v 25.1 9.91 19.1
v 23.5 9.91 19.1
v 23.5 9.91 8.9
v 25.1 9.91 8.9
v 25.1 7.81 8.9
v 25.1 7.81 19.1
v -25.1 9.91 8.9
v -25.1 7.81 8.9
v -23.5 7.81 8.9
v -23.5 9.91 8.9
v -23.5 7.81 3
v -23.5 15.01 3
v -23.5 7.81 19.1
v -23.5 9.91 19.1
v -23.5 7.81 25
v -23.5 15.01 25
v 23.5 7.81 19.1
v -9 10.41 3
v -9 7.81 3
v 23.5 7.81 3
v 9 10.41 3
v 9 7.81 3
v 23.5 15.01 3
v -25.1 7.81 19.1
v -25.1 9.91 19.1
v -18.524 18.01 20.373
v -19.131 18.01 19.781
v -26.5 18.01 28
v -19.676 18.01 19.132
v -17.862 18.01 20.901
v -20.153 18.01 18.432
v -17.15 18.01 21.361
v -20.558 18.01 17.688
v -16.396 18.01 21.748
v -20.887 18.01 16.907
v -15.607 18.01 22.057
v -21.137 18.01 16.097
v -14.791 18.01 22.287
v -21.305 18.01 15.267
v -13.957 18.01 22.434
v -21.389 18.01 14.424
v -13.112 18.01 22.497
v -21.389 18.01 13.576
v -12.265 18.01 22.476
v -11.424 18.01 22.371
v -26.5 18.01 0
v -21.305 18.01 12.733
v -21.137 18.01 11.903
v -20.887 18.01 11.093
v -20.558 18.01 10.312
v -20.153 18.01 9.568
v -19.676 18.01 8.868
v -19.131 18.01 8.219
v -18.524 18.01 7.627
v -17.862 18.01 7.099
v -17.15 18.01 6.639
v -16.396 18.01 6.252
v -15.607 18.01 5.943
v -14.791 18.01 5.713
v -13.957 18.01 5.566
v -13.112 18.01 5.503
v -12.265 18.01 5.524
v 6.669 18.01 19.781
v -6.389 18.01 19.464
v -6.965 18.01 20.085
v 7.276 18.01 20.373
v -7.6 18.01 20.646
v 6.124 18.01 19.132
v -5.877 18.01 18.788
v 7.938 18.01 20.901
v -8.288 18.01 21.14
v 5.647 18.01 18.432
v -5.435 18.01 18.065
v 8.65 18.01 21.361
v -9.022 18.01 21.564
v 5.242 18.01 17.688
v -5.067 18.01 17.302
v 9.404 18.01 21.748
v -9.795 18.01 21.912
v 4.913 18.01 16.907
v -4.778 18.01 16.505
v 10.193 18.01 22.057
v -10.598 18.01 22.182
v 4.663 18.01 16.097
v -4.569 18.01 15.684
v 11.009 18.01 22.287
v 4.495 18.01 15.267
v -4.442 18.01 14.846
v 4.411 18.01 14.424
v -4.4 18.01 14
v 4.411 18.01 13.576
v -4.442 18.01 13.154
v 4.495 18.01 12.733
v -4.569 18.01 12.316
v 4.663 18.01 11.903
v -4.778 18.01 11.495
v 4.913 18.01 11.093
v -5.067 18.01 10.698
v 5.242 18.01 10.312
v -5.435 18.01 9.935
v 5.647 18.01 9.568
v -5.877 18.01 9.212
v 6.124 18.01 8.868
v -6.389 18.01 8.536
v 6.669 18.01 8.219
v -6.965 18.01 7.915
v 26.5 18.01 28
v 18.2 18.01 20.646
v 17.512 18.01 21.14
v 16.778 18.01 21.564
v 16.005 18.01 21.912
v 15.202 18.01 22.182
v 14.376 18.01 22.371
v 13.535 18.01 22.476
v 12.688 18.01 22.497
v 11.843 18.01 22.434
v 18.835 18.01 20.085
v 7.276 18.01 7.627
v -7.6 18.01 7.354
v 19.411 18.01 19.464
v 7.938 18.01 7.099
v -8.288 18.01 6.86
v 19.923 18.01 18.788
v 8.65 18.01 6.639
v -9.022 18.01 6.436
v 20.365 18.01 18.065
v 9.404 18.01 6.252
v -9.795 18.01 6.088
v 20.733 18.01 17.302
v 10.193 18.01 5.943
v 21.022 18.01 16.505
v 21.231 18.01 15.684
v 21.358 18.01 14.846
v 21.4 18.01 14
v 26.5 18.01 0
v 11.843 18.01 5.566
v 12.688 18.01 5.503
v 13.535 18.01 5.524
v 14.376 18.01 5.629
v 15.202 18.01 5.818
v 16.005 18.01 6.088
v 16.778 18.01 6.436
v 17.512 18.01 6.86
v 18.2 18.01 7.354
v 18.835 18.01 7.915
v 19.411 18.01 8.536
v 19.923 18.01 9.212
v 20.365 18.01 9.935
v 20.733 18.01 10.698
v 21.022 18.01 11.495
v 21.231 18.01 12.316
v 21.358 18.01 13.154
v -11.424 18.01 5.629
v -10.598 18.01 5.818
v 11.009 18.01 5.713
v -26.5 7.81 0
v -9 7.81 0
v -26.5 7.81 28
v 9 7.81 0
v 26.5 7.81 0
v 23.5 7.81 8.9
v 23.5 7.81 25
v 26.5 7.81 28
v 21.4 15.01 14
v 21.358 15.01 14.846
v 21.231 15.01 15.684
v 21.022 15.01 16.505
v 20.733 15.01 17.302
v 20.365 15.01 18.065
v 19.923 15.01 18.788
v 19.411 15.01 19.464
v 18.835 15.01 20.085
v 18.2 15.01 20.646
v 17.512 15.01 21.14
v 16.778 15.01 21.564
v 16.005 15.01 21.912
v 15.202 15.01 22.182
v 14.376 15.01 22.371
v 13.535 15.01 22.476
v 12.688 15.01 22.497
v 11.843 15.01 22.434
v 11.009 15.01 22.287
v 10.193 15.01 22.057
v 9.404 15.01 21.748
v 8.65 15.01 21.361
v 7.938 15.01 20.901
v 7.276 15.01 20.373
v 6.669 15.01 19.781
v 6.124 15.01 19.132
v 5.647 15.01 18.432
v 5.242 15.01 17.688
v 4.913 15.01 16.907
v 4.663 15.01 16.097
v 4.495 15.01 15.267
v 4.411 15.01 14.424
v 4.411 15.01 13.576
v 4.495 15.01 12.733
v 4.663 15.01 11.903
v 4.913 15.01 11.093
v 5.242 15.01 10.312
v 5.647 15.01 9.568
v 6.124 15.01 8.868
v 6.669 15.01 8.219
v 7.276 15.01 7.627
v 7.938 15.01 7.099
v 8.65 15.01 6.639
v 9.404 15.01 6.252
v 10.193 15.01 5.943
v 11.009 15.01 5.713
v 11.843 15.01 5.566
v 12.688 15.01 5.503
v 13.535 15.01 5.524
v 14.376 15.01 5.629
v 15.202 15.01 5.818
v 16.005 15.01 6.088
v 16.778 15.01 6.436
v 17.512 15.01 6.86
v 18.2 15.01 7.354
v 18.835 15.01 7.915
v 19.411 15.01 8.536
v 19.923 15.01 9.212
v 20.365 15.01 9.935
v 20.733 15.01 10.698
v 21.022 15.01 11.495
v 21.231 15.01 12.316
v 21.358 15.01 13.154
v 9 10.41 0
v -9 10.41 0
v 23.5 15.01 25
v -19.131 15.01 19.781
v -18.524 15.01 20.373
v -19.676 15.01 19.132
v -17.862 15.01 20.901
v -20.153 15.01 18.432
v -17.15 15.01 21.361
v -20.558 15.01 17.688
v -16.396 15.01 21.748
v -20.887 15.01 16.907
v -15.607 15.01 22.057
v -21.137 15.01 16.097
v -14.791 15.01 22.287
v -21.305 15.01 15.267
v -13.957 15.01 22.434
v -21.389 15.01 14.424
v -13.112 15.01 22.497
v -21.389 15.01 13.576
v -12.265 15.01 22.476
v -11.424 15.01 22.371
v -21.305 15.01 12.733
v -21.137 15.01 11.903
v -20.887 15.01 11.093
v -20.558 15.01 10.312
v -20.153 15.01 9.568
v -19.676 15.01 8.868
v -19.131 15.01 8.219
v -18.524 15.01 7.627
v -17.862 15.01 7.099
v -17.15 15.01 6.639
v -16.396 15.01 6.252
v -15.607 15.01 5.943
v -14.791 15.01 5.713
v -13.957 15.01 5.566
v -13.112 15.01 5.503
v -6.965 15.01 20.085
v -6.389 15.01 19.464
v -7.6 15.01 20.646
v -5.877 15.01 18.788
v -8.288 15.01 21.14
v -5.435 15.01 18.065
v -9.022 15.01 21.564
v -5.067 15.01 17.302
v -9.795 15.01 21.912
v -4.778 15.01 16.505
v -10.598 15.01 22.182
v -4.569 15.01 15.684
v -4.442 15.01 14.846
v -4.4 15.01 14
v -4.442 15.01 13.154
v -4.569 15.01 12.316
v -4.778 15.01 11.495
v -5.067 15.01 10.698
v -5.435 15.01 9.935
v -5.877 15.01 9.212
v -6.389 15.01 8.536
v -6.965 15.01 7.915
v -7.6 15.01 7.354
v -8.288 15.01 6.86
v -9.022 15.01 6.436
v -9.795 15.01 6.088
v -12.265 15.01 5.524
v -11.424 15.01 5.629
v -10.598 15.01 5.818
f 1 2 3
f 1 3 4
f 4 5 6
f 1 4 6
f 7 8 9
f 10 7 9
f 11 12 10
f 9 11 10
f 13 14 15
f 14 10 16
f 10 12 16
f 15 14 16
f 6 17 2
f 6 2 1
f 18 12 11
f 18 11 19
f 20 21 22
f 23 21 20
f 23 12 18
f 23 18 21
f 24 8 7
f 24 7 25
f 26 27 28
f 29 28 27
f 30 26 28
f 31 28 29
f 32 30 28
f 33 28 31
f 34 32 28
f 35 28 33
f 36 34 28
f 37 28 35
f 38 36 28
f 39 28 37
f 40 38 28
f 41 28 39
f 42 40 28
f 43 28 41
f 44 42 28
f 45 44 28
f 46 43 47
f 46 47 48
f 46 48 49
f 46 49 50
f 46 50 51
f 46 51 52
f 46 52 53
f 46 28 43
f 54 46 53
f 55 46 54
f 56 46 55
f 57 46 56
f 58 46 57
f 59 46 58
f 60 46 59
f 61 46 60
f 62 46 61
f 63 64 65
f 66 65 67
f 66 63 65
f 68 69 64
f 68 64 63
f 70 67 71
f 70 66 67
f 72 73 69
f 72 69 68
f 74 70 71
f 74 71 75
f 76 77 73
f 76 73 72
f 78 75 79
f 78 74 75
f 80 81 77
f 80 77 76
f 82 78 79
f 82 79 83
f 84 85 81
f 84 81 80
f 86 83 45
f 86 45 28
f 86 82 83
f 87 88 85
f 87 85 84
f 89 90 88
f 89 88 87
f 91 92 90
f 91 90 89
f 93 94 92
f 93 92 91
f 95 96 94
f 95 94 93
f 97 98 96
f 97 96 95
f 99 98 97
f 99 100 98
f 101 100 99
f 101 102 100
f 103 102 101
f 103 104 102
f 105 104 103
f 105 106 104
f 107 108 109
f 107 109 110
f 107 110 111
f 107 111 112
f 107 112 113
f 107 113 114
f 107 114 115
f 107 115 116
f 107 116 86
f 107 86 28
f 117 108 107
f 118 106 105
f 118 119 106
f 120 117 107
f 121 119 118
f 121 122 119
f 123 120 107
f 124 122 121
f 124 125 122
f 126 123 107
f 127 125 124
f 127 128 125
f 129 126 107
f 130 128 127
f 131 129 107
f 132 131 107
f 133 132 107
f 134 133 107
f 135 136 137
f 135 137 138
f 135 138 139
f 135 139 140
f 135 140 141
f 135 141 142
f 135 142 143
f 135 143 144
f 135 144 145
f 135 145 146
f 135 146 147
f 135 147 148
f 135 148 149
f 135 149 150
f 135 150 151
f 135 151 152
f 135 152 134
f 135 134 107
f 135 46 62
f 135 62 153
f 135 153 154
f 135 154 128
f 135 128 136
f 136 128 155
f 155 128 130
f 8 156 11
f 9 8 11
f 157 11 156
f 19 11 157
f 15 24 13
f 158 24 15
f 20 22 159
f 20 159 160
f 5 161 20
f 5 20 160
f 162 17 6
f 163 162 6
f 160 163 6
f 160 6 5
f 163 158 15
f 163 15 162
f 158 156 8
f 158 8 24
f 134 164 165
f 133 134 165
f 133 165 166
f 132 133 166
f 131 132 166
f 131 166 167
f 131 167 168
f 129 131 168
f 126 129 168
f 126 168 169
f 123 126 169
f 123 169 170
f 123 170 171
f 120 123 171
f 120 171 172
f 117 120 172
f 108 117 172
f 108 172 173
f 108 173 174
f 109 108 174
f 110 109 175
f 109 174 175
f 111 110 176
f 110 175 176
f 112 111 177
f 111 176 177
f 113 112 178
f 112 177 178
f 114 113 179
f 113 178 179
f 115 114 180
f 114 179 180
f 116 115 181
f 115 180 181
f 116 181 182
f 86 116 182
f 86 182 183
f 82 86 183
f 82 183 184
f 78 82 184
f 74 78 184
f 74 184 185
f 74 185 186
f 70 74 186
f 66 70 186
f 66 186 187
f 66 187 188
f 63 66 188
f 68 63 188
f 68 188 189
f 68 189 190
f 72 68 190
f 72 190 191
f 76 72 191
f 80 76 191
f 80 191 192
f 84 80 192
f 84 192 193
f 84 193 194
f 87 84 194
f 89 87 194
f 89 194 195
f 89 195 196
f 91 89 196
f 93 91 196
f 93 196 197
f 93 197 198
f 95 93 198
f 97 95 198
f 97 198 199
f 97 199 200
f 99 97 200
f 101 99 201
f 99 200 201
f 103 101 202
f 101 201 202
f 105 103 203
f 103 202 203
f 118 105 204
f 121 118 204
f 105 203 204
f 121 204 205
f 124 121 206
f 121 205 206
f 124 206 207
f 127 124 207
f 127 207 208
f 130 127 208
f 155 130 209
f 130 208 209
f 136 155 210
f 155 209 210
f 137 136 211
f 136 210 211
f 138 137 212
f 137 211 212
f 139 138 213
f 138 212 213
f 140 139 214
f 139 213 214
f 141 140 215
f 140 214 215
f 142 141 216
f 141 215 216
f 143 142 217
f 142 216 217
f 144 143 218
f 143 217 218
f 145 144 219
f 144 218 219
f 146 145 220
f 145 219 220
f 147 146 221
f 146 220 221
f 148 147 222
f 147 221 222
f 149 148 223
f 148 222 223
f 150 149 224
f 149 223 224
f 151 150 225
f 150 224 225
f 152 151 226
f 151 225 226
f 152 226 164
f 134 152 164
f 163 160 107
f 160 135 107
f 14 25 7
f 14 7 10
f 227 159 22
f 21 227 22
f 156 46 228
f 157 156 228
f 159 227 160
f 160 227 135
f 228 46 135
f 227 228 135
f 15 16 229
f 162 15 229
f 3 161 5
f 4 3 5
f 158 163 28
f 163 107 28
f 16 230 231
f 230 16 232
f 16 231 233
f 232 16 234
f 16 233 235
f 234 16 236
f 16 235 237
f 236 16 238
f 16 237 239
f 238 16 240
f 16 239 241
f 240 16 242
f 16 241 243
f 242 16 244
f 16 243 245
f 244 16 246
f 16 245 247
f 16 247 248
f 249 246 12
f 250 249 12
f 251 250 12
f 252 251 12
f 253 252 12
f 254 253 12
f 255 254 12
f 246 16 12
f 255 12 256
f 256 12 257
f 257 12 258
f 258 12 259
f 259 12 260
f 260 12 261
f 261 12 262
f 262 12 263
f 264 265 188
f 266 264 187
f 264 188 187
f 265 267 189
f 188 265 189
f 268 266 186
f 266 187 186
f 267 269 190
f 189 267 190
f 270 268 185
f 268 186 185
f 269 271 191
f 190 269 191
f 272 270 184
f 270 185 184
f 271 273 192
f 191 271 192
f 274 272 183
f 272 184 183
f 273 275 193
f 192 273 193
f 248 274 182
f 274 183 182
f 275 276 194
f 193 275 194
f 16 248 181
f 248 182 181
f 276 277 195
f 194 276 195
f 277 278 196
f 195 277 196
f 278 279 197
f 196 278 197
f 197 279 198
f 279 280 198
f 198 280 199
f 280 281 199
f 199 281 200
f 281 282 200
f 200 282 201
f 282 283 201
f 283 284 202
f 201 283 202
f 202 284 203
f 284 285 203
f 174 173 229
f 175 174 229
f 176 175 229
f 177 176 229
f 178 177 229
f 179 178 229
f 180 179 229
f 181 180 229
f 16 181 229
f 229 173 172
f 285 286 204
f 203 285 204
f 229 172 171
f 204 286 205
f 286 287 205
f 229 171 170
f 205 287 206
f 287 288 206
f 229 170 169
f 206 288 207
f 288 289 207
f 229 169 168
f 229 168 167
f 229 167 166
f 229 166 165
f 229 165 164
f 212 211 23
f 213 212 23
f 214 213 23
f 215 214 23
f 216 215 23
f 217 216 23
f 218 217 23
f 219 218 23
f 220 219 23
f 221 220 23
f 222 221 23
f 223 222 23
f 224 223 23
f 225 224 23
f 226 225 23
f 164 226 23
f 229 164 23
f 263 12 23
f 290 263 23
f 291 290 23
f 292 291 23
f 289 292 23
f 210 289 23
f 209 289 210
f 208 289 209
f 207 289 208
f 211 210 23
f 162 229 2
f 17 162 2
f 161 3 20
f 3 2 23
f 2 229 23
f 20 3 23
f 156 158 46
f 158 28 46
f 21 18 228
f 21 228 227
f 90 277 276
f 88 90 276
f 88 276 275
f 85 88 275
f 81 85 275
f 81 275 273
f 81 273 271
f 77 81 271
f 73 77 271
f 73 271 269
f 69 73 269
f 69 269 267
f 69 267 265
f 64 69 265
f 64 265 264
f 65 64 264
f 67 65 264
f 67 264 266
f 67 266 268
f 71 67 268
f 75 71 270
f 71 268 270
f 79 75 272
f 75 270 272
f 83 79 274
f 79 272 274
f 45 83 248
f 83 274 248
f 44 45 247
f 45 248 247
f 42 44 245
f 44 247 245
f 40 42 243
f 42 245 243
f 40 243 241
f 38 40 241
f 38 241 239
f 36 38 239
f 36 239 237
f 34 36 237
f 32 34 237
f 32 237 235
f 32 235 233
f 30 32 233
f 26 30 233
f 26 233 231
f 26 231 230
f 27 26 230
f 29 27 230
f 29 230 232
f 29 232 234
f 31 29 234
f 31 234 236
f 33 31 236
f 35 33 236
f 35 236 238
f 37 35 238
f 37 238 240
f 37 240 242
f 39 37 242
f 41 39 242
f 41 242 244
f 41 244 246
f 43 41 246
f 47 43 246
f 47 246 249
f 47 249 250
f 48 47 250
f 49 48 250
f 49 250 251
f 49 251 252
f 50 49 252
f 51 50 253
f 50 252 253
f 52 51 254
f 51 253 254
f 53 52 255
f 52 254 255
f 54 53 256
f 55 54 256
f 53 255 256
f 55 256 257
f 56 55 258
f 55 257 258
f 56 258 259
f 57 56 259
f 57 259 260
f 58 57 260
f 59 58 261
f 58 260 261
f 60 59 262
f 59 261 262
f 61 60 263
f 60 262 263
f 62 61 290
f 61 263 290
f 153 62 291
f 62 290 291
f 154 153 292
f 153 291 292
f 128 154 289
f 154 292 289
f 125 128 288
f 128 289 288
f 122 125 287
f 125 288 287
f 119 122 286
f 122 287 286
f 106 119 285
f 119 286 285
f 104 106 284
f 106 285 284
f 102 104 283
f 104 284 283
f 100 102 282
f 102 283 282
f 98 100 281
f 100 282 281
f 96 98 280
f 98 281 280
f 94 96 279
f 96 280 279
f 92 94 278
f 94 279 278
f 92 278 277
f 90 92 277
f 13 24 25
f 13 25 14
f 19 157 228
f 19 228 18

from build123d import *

# Parameters (mm, degrees)
SKETCH2_R           = 3.175
BOSS_EXTRUDE1_DEPTH = 3
SKETCH4_W           = 53
SKETCH4_H           = 25
BOSS_EXTRUDE3_DEPTH = 3
BOSS_EXTRUDE4_DEPTH = 7.2
SKETCH6_R           = 8.5
CUT_EXTRUDE1_DEPTH  = 7.2
SKETCH7_W           = 18
SKETCH7_H           = 6
CUT_EXTRUDE2_DEPTH  = 2.6
SKETCH8_W           = 1.6
SKETCH8_H           = 10.2
CUT_EXTRUDE3_DEPTH  = 2.1
CUT_EXTRUDE4_START  = -3
CUT_EXTRUDE4_DEPTH  = 3


with BuildPart() as part:
    # Sketch2 → Boss-Extrude1 (new body)
    with BuildSketch(Plane.XY):
        with BuildLine():
            Line((26.5, 7.809866434), (26.5, 7.967433715))
            Line((26.5, 7.967433715), (51.343101615, 22.31060512))
            ThreePointArc((51.343101615, 22.31060512), (51.20337497, 29.562282322), (44.993101615, 33.309127748))
            Line((44.993101615, 33.309127748), (18.494003701, 18.009866434))
            Line((18.494003701, 18.009866434), (-18.494003701, 18.009866434))
            Line((-18.494003701, 18.009866434), (-44.993101615, 33.309127748))
            ThreePointArc((-44.993101615, 33.309127748), (-51.20337497, 29.562282322), (-51.343101615, 22.31060512))
            Line((-51.343101615, 22.31060512), (-26.5, 7.967433715))
            Line((-26.5, 7.967433715), (-26.5, 7.809866434))
            Line((-26.5, 7.809866434), (26.5, 7.809866434))
        make_face()
        with Locations((44.704, 25.809866434)):
            Circle(SKETCH2_R, mode=Mode.SUBTRACT)
        with Locations((-44.704, 25.809866434)):
            Circle(SKETCH2_R, mode=Mode.SUBTRACT)
    extrude(amount=BOSS_EXTRUDE1_DEPTH)

    # Sketch4 → Boss-Extrude3 (add)
    with BuildSketch(Plane(origin=(0, 18.009866434, 0), x_dir=(1, 0, 0), z_dir=(0, 1, 0))):
        with Locations((0, -15.5)):
            Rectangle(SKETCH4_W, SKETCH4_H)
    extrude(amount=-BOSS_EXTRUDE3_DEPTH)

    # Sketch5 → Boss-Extrude4 (add)
    with BuildSketch(Plane.XZ.offset(-15.009866434)):
        Polygon((-26.5, 3), (-23.5, 3), (-23.5, 25), (23.5, 25), (23.5, 3), (26.5, 3), (26.5, 28), (-26.5, 28), align=None)
    extrude(amount=BOSS_EXTRUDE4_DEPTH)

    # Sketch6 → Cut-Extrude1 (cut)
    with BuildSketch(Plane.XZ.offset(-15.009866434)):
        with Locations((12.9, 14)):
            Circle(SKETCH6_R)
        with Locations((-12.9, 14)):
            Circle(SKETCH6_R)
    extrude(amount=-CUT_EXTRUDE1_DEPTH, mode=Mode.SUBTRACT)

    # Sketch7 → Cut-Extrude2 (cut)
    with BuildSketch(Plane.XZ.offset(-7.809866434)):
        with Locations((0, 3)):
            Rectangle(SKETCH7_W, SKETCH7_H)
    extrude(amount=-CUT_EXTRUDE2_DEPTH, mode=Mode.SUBTRACT)

    # Sketch8 → Cut-Extrude3 (cut)
    with BuildSketch(Plane.XZ.offset(-7.809866434)):
        with Locations((-24.3, 14)):
            Rectangle(SKETCH8_W, SKETCH8_H)
        with Locations((24.3, 14)):
            Rectangle(SKETCH8_W, SKETCH8_H)
    extrude(amount=-CUT_EXTRUDE3_DEPTH, mode=Mode.SUBTRACT)

    # Sketch11 → Cut-Extrude4 (cut)
    with BuildSketch(Plane.XY.offset(3).offset(CUT_EXTRUDE4_START)):
        with BuildLine():
            Line((-51.343101615, 22.31060512), (-26.5, 7.967433715))
            Line((-26.5, 7.967433715), (-26.5, 18.009866434))
            Line((-26.5, 18.009866434), (-18.494003701, 18.009866434))
            Line((-18.494003701, 18.009866434), (-44.993101615, 33.309127748))
            ThreePointArc((-44.993101615, 33.309127748), (-51.20337497, 29.562282322), (-51.343101615, 22.31060512))
        make_face()
        with BuildLine():
            Line((26.5, 18.009866434), (26.5, 7.967433715))
            Line((26.5, 7.967433715), (51.343101615, 22.31060512))
            ThreePointArc((51.343101615, 22.31060512), (51.20337497, 29.562282322), (44.993101615, 33.309127748))
            Line((44.993101615, 33.309127748), (18.494003701, 18.009866434))
            Line((18.494003701, 18.009866434), (26.5, 18.009866434))
        make_face()
    extrude(amount=CUT_EXTRUDE4_DEPTH, mode=Mode.SUBTRACT)


solid = part.part
